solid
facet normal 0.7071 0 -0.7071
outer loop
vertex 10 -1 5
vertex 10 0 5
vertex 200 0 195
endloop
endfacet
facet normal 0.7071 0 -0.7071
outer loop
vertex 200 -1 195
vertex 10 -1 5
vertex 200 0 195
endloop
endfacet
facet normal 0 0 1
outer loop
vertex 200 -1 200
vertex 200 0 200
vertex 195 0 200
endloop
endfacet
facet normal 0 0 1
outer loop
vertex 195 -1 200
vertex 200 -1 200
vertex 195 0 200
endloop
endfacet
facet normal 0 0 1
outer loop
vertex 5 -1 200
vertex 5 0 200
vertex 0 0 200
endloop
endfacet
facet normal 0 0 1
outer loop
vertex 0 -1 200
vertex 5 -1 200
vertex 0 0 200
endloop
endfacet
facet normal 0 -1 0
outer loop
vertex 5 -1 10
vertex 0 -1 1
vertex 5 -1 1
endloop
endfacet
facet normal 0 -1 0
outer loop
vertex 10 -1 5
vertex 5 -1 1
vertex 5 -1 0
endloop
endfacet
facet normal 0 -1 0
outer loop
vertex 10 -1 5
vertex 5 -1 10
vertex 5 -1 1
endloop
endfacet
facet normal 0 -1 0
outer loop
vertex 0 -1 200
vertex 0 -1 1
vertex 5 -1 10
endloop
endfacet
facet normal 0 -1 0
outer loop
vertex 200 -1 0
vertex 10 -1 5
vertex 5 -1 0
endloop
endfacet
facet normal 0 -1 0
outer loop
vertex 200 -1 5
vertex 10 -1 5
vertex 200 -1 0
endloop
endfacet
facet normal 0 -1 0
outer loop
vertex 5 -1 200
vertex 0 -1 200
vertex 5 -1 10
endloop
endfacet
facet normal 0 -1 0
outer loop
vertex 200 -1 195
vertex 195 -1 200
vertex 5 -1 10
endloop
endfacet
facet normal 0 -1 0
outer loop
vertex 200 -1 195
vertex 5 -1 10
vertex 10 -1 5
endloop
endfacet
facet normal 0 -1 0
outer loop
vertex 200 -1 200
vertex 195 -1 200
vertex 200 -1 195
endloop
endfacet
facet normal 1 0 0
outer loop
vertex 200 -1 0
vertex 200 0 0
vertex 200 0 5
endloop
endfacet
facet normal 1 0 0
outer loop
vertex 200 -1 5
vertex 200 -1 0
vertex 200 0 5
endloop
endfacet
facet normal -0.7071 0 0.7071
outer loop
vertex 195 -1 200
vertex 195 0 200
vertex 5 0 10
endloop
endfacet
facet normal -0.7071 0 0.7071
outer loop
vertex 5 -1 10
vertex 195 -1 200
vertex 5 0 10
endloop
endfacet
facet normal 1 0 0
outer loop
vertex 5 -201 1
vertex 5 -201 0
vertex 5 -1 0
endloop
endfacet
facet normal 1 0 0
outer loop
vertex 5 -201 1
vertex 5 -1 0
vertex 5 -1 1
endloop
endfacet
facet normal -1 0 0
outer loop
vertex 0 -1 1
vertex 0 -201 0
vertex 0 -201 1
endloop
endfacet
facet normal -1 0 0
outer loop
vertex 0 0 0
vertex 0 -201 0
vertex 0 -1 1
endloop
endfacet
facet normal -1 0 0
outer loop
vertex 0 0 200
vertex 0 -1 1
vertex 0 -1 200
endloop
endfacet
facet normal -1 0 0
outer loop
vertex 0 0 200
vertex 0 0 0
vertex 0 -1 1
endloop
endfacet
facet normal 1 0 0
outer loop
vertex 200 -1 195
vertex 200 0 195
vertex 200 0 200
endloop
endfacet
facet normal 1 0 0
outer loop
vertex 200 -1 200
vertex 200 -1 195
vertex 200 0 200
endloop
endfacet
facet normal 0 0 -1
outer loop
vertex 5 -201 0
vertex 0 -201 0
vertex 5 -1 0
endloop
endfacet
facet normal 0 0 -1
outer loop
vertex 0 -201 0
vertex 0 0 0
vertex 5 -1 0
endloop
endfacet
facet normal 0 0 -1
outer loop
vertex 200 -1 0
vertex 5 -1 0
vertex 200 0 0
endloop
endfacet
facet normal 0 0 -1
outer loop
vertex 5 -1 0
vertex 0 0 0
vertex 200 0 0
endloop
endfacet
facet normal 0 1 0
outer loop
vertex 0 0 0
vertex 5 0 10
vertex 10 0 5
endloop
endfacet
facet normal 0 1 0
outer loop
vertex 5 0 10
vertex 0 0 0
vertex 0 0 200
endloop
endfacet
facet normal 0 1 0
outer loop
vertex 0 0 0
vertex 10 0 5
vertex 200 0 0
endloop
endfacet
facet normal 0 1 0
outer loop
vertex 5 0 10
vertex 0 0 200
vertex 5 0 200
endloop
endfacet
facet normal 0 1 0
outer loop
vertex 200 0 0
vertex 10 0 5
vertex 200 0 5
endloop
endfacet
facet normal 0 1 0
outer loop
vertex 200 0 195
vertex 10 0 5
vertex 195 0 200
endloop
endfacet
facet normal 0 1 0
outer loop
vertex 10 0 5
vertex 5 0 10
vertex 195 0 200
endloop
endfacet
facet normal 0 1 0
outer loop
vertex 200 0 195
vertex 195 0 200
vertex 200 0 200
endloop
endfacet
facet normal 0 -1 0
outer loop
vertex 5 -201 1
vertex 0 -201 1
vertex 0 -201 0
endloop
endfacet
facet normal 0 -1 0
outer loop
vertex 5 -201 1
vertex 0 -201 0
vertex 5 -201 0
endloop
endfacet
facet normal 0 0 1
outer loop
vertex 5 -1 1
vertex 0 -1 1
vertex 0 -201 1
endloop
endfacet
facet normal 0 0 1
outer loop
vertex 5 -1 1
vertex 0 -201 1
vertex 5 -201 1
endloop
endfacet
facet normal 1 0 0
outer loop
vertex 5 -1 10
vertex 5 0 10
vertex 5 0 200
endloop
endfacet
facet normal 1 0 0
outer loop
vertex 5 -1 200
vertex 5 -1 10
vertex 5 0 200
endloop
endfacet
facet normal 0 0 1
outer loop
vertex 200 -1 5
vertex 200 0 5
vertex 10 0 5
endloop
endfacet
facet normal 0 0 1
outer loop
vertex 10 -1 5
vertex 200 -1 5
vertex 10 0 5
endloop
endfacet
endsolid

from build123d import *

# Parameters (mm, degrees)
F1_DEPTH = 1
F2_W     = 5
F2_H     = 1
F3_DEPTH = 200


with BuildPart() as f1:
    # F0 (on Front) → F1 (new body)
    with BuildSketch(Plane.XZ):
        Polygon((0, 5), (0, 0), (5, 0), (200, 0), (200, 5), (10, 5), (200, 195), (200, 200), (195, 200), (5, 10), (5, 200), (0, 200), align=None)
    extrude(amount=F1_DEPTH)

    # F2 (on face) → F3 (join)
    with BuildSketch(Plane.XZ.offset(1)):
        with Locations((2.5, 0.5)):
            Rectangle(F2_W, F2_H)
    extrude(amount=F3_DEPTH)


solid = f1.part
